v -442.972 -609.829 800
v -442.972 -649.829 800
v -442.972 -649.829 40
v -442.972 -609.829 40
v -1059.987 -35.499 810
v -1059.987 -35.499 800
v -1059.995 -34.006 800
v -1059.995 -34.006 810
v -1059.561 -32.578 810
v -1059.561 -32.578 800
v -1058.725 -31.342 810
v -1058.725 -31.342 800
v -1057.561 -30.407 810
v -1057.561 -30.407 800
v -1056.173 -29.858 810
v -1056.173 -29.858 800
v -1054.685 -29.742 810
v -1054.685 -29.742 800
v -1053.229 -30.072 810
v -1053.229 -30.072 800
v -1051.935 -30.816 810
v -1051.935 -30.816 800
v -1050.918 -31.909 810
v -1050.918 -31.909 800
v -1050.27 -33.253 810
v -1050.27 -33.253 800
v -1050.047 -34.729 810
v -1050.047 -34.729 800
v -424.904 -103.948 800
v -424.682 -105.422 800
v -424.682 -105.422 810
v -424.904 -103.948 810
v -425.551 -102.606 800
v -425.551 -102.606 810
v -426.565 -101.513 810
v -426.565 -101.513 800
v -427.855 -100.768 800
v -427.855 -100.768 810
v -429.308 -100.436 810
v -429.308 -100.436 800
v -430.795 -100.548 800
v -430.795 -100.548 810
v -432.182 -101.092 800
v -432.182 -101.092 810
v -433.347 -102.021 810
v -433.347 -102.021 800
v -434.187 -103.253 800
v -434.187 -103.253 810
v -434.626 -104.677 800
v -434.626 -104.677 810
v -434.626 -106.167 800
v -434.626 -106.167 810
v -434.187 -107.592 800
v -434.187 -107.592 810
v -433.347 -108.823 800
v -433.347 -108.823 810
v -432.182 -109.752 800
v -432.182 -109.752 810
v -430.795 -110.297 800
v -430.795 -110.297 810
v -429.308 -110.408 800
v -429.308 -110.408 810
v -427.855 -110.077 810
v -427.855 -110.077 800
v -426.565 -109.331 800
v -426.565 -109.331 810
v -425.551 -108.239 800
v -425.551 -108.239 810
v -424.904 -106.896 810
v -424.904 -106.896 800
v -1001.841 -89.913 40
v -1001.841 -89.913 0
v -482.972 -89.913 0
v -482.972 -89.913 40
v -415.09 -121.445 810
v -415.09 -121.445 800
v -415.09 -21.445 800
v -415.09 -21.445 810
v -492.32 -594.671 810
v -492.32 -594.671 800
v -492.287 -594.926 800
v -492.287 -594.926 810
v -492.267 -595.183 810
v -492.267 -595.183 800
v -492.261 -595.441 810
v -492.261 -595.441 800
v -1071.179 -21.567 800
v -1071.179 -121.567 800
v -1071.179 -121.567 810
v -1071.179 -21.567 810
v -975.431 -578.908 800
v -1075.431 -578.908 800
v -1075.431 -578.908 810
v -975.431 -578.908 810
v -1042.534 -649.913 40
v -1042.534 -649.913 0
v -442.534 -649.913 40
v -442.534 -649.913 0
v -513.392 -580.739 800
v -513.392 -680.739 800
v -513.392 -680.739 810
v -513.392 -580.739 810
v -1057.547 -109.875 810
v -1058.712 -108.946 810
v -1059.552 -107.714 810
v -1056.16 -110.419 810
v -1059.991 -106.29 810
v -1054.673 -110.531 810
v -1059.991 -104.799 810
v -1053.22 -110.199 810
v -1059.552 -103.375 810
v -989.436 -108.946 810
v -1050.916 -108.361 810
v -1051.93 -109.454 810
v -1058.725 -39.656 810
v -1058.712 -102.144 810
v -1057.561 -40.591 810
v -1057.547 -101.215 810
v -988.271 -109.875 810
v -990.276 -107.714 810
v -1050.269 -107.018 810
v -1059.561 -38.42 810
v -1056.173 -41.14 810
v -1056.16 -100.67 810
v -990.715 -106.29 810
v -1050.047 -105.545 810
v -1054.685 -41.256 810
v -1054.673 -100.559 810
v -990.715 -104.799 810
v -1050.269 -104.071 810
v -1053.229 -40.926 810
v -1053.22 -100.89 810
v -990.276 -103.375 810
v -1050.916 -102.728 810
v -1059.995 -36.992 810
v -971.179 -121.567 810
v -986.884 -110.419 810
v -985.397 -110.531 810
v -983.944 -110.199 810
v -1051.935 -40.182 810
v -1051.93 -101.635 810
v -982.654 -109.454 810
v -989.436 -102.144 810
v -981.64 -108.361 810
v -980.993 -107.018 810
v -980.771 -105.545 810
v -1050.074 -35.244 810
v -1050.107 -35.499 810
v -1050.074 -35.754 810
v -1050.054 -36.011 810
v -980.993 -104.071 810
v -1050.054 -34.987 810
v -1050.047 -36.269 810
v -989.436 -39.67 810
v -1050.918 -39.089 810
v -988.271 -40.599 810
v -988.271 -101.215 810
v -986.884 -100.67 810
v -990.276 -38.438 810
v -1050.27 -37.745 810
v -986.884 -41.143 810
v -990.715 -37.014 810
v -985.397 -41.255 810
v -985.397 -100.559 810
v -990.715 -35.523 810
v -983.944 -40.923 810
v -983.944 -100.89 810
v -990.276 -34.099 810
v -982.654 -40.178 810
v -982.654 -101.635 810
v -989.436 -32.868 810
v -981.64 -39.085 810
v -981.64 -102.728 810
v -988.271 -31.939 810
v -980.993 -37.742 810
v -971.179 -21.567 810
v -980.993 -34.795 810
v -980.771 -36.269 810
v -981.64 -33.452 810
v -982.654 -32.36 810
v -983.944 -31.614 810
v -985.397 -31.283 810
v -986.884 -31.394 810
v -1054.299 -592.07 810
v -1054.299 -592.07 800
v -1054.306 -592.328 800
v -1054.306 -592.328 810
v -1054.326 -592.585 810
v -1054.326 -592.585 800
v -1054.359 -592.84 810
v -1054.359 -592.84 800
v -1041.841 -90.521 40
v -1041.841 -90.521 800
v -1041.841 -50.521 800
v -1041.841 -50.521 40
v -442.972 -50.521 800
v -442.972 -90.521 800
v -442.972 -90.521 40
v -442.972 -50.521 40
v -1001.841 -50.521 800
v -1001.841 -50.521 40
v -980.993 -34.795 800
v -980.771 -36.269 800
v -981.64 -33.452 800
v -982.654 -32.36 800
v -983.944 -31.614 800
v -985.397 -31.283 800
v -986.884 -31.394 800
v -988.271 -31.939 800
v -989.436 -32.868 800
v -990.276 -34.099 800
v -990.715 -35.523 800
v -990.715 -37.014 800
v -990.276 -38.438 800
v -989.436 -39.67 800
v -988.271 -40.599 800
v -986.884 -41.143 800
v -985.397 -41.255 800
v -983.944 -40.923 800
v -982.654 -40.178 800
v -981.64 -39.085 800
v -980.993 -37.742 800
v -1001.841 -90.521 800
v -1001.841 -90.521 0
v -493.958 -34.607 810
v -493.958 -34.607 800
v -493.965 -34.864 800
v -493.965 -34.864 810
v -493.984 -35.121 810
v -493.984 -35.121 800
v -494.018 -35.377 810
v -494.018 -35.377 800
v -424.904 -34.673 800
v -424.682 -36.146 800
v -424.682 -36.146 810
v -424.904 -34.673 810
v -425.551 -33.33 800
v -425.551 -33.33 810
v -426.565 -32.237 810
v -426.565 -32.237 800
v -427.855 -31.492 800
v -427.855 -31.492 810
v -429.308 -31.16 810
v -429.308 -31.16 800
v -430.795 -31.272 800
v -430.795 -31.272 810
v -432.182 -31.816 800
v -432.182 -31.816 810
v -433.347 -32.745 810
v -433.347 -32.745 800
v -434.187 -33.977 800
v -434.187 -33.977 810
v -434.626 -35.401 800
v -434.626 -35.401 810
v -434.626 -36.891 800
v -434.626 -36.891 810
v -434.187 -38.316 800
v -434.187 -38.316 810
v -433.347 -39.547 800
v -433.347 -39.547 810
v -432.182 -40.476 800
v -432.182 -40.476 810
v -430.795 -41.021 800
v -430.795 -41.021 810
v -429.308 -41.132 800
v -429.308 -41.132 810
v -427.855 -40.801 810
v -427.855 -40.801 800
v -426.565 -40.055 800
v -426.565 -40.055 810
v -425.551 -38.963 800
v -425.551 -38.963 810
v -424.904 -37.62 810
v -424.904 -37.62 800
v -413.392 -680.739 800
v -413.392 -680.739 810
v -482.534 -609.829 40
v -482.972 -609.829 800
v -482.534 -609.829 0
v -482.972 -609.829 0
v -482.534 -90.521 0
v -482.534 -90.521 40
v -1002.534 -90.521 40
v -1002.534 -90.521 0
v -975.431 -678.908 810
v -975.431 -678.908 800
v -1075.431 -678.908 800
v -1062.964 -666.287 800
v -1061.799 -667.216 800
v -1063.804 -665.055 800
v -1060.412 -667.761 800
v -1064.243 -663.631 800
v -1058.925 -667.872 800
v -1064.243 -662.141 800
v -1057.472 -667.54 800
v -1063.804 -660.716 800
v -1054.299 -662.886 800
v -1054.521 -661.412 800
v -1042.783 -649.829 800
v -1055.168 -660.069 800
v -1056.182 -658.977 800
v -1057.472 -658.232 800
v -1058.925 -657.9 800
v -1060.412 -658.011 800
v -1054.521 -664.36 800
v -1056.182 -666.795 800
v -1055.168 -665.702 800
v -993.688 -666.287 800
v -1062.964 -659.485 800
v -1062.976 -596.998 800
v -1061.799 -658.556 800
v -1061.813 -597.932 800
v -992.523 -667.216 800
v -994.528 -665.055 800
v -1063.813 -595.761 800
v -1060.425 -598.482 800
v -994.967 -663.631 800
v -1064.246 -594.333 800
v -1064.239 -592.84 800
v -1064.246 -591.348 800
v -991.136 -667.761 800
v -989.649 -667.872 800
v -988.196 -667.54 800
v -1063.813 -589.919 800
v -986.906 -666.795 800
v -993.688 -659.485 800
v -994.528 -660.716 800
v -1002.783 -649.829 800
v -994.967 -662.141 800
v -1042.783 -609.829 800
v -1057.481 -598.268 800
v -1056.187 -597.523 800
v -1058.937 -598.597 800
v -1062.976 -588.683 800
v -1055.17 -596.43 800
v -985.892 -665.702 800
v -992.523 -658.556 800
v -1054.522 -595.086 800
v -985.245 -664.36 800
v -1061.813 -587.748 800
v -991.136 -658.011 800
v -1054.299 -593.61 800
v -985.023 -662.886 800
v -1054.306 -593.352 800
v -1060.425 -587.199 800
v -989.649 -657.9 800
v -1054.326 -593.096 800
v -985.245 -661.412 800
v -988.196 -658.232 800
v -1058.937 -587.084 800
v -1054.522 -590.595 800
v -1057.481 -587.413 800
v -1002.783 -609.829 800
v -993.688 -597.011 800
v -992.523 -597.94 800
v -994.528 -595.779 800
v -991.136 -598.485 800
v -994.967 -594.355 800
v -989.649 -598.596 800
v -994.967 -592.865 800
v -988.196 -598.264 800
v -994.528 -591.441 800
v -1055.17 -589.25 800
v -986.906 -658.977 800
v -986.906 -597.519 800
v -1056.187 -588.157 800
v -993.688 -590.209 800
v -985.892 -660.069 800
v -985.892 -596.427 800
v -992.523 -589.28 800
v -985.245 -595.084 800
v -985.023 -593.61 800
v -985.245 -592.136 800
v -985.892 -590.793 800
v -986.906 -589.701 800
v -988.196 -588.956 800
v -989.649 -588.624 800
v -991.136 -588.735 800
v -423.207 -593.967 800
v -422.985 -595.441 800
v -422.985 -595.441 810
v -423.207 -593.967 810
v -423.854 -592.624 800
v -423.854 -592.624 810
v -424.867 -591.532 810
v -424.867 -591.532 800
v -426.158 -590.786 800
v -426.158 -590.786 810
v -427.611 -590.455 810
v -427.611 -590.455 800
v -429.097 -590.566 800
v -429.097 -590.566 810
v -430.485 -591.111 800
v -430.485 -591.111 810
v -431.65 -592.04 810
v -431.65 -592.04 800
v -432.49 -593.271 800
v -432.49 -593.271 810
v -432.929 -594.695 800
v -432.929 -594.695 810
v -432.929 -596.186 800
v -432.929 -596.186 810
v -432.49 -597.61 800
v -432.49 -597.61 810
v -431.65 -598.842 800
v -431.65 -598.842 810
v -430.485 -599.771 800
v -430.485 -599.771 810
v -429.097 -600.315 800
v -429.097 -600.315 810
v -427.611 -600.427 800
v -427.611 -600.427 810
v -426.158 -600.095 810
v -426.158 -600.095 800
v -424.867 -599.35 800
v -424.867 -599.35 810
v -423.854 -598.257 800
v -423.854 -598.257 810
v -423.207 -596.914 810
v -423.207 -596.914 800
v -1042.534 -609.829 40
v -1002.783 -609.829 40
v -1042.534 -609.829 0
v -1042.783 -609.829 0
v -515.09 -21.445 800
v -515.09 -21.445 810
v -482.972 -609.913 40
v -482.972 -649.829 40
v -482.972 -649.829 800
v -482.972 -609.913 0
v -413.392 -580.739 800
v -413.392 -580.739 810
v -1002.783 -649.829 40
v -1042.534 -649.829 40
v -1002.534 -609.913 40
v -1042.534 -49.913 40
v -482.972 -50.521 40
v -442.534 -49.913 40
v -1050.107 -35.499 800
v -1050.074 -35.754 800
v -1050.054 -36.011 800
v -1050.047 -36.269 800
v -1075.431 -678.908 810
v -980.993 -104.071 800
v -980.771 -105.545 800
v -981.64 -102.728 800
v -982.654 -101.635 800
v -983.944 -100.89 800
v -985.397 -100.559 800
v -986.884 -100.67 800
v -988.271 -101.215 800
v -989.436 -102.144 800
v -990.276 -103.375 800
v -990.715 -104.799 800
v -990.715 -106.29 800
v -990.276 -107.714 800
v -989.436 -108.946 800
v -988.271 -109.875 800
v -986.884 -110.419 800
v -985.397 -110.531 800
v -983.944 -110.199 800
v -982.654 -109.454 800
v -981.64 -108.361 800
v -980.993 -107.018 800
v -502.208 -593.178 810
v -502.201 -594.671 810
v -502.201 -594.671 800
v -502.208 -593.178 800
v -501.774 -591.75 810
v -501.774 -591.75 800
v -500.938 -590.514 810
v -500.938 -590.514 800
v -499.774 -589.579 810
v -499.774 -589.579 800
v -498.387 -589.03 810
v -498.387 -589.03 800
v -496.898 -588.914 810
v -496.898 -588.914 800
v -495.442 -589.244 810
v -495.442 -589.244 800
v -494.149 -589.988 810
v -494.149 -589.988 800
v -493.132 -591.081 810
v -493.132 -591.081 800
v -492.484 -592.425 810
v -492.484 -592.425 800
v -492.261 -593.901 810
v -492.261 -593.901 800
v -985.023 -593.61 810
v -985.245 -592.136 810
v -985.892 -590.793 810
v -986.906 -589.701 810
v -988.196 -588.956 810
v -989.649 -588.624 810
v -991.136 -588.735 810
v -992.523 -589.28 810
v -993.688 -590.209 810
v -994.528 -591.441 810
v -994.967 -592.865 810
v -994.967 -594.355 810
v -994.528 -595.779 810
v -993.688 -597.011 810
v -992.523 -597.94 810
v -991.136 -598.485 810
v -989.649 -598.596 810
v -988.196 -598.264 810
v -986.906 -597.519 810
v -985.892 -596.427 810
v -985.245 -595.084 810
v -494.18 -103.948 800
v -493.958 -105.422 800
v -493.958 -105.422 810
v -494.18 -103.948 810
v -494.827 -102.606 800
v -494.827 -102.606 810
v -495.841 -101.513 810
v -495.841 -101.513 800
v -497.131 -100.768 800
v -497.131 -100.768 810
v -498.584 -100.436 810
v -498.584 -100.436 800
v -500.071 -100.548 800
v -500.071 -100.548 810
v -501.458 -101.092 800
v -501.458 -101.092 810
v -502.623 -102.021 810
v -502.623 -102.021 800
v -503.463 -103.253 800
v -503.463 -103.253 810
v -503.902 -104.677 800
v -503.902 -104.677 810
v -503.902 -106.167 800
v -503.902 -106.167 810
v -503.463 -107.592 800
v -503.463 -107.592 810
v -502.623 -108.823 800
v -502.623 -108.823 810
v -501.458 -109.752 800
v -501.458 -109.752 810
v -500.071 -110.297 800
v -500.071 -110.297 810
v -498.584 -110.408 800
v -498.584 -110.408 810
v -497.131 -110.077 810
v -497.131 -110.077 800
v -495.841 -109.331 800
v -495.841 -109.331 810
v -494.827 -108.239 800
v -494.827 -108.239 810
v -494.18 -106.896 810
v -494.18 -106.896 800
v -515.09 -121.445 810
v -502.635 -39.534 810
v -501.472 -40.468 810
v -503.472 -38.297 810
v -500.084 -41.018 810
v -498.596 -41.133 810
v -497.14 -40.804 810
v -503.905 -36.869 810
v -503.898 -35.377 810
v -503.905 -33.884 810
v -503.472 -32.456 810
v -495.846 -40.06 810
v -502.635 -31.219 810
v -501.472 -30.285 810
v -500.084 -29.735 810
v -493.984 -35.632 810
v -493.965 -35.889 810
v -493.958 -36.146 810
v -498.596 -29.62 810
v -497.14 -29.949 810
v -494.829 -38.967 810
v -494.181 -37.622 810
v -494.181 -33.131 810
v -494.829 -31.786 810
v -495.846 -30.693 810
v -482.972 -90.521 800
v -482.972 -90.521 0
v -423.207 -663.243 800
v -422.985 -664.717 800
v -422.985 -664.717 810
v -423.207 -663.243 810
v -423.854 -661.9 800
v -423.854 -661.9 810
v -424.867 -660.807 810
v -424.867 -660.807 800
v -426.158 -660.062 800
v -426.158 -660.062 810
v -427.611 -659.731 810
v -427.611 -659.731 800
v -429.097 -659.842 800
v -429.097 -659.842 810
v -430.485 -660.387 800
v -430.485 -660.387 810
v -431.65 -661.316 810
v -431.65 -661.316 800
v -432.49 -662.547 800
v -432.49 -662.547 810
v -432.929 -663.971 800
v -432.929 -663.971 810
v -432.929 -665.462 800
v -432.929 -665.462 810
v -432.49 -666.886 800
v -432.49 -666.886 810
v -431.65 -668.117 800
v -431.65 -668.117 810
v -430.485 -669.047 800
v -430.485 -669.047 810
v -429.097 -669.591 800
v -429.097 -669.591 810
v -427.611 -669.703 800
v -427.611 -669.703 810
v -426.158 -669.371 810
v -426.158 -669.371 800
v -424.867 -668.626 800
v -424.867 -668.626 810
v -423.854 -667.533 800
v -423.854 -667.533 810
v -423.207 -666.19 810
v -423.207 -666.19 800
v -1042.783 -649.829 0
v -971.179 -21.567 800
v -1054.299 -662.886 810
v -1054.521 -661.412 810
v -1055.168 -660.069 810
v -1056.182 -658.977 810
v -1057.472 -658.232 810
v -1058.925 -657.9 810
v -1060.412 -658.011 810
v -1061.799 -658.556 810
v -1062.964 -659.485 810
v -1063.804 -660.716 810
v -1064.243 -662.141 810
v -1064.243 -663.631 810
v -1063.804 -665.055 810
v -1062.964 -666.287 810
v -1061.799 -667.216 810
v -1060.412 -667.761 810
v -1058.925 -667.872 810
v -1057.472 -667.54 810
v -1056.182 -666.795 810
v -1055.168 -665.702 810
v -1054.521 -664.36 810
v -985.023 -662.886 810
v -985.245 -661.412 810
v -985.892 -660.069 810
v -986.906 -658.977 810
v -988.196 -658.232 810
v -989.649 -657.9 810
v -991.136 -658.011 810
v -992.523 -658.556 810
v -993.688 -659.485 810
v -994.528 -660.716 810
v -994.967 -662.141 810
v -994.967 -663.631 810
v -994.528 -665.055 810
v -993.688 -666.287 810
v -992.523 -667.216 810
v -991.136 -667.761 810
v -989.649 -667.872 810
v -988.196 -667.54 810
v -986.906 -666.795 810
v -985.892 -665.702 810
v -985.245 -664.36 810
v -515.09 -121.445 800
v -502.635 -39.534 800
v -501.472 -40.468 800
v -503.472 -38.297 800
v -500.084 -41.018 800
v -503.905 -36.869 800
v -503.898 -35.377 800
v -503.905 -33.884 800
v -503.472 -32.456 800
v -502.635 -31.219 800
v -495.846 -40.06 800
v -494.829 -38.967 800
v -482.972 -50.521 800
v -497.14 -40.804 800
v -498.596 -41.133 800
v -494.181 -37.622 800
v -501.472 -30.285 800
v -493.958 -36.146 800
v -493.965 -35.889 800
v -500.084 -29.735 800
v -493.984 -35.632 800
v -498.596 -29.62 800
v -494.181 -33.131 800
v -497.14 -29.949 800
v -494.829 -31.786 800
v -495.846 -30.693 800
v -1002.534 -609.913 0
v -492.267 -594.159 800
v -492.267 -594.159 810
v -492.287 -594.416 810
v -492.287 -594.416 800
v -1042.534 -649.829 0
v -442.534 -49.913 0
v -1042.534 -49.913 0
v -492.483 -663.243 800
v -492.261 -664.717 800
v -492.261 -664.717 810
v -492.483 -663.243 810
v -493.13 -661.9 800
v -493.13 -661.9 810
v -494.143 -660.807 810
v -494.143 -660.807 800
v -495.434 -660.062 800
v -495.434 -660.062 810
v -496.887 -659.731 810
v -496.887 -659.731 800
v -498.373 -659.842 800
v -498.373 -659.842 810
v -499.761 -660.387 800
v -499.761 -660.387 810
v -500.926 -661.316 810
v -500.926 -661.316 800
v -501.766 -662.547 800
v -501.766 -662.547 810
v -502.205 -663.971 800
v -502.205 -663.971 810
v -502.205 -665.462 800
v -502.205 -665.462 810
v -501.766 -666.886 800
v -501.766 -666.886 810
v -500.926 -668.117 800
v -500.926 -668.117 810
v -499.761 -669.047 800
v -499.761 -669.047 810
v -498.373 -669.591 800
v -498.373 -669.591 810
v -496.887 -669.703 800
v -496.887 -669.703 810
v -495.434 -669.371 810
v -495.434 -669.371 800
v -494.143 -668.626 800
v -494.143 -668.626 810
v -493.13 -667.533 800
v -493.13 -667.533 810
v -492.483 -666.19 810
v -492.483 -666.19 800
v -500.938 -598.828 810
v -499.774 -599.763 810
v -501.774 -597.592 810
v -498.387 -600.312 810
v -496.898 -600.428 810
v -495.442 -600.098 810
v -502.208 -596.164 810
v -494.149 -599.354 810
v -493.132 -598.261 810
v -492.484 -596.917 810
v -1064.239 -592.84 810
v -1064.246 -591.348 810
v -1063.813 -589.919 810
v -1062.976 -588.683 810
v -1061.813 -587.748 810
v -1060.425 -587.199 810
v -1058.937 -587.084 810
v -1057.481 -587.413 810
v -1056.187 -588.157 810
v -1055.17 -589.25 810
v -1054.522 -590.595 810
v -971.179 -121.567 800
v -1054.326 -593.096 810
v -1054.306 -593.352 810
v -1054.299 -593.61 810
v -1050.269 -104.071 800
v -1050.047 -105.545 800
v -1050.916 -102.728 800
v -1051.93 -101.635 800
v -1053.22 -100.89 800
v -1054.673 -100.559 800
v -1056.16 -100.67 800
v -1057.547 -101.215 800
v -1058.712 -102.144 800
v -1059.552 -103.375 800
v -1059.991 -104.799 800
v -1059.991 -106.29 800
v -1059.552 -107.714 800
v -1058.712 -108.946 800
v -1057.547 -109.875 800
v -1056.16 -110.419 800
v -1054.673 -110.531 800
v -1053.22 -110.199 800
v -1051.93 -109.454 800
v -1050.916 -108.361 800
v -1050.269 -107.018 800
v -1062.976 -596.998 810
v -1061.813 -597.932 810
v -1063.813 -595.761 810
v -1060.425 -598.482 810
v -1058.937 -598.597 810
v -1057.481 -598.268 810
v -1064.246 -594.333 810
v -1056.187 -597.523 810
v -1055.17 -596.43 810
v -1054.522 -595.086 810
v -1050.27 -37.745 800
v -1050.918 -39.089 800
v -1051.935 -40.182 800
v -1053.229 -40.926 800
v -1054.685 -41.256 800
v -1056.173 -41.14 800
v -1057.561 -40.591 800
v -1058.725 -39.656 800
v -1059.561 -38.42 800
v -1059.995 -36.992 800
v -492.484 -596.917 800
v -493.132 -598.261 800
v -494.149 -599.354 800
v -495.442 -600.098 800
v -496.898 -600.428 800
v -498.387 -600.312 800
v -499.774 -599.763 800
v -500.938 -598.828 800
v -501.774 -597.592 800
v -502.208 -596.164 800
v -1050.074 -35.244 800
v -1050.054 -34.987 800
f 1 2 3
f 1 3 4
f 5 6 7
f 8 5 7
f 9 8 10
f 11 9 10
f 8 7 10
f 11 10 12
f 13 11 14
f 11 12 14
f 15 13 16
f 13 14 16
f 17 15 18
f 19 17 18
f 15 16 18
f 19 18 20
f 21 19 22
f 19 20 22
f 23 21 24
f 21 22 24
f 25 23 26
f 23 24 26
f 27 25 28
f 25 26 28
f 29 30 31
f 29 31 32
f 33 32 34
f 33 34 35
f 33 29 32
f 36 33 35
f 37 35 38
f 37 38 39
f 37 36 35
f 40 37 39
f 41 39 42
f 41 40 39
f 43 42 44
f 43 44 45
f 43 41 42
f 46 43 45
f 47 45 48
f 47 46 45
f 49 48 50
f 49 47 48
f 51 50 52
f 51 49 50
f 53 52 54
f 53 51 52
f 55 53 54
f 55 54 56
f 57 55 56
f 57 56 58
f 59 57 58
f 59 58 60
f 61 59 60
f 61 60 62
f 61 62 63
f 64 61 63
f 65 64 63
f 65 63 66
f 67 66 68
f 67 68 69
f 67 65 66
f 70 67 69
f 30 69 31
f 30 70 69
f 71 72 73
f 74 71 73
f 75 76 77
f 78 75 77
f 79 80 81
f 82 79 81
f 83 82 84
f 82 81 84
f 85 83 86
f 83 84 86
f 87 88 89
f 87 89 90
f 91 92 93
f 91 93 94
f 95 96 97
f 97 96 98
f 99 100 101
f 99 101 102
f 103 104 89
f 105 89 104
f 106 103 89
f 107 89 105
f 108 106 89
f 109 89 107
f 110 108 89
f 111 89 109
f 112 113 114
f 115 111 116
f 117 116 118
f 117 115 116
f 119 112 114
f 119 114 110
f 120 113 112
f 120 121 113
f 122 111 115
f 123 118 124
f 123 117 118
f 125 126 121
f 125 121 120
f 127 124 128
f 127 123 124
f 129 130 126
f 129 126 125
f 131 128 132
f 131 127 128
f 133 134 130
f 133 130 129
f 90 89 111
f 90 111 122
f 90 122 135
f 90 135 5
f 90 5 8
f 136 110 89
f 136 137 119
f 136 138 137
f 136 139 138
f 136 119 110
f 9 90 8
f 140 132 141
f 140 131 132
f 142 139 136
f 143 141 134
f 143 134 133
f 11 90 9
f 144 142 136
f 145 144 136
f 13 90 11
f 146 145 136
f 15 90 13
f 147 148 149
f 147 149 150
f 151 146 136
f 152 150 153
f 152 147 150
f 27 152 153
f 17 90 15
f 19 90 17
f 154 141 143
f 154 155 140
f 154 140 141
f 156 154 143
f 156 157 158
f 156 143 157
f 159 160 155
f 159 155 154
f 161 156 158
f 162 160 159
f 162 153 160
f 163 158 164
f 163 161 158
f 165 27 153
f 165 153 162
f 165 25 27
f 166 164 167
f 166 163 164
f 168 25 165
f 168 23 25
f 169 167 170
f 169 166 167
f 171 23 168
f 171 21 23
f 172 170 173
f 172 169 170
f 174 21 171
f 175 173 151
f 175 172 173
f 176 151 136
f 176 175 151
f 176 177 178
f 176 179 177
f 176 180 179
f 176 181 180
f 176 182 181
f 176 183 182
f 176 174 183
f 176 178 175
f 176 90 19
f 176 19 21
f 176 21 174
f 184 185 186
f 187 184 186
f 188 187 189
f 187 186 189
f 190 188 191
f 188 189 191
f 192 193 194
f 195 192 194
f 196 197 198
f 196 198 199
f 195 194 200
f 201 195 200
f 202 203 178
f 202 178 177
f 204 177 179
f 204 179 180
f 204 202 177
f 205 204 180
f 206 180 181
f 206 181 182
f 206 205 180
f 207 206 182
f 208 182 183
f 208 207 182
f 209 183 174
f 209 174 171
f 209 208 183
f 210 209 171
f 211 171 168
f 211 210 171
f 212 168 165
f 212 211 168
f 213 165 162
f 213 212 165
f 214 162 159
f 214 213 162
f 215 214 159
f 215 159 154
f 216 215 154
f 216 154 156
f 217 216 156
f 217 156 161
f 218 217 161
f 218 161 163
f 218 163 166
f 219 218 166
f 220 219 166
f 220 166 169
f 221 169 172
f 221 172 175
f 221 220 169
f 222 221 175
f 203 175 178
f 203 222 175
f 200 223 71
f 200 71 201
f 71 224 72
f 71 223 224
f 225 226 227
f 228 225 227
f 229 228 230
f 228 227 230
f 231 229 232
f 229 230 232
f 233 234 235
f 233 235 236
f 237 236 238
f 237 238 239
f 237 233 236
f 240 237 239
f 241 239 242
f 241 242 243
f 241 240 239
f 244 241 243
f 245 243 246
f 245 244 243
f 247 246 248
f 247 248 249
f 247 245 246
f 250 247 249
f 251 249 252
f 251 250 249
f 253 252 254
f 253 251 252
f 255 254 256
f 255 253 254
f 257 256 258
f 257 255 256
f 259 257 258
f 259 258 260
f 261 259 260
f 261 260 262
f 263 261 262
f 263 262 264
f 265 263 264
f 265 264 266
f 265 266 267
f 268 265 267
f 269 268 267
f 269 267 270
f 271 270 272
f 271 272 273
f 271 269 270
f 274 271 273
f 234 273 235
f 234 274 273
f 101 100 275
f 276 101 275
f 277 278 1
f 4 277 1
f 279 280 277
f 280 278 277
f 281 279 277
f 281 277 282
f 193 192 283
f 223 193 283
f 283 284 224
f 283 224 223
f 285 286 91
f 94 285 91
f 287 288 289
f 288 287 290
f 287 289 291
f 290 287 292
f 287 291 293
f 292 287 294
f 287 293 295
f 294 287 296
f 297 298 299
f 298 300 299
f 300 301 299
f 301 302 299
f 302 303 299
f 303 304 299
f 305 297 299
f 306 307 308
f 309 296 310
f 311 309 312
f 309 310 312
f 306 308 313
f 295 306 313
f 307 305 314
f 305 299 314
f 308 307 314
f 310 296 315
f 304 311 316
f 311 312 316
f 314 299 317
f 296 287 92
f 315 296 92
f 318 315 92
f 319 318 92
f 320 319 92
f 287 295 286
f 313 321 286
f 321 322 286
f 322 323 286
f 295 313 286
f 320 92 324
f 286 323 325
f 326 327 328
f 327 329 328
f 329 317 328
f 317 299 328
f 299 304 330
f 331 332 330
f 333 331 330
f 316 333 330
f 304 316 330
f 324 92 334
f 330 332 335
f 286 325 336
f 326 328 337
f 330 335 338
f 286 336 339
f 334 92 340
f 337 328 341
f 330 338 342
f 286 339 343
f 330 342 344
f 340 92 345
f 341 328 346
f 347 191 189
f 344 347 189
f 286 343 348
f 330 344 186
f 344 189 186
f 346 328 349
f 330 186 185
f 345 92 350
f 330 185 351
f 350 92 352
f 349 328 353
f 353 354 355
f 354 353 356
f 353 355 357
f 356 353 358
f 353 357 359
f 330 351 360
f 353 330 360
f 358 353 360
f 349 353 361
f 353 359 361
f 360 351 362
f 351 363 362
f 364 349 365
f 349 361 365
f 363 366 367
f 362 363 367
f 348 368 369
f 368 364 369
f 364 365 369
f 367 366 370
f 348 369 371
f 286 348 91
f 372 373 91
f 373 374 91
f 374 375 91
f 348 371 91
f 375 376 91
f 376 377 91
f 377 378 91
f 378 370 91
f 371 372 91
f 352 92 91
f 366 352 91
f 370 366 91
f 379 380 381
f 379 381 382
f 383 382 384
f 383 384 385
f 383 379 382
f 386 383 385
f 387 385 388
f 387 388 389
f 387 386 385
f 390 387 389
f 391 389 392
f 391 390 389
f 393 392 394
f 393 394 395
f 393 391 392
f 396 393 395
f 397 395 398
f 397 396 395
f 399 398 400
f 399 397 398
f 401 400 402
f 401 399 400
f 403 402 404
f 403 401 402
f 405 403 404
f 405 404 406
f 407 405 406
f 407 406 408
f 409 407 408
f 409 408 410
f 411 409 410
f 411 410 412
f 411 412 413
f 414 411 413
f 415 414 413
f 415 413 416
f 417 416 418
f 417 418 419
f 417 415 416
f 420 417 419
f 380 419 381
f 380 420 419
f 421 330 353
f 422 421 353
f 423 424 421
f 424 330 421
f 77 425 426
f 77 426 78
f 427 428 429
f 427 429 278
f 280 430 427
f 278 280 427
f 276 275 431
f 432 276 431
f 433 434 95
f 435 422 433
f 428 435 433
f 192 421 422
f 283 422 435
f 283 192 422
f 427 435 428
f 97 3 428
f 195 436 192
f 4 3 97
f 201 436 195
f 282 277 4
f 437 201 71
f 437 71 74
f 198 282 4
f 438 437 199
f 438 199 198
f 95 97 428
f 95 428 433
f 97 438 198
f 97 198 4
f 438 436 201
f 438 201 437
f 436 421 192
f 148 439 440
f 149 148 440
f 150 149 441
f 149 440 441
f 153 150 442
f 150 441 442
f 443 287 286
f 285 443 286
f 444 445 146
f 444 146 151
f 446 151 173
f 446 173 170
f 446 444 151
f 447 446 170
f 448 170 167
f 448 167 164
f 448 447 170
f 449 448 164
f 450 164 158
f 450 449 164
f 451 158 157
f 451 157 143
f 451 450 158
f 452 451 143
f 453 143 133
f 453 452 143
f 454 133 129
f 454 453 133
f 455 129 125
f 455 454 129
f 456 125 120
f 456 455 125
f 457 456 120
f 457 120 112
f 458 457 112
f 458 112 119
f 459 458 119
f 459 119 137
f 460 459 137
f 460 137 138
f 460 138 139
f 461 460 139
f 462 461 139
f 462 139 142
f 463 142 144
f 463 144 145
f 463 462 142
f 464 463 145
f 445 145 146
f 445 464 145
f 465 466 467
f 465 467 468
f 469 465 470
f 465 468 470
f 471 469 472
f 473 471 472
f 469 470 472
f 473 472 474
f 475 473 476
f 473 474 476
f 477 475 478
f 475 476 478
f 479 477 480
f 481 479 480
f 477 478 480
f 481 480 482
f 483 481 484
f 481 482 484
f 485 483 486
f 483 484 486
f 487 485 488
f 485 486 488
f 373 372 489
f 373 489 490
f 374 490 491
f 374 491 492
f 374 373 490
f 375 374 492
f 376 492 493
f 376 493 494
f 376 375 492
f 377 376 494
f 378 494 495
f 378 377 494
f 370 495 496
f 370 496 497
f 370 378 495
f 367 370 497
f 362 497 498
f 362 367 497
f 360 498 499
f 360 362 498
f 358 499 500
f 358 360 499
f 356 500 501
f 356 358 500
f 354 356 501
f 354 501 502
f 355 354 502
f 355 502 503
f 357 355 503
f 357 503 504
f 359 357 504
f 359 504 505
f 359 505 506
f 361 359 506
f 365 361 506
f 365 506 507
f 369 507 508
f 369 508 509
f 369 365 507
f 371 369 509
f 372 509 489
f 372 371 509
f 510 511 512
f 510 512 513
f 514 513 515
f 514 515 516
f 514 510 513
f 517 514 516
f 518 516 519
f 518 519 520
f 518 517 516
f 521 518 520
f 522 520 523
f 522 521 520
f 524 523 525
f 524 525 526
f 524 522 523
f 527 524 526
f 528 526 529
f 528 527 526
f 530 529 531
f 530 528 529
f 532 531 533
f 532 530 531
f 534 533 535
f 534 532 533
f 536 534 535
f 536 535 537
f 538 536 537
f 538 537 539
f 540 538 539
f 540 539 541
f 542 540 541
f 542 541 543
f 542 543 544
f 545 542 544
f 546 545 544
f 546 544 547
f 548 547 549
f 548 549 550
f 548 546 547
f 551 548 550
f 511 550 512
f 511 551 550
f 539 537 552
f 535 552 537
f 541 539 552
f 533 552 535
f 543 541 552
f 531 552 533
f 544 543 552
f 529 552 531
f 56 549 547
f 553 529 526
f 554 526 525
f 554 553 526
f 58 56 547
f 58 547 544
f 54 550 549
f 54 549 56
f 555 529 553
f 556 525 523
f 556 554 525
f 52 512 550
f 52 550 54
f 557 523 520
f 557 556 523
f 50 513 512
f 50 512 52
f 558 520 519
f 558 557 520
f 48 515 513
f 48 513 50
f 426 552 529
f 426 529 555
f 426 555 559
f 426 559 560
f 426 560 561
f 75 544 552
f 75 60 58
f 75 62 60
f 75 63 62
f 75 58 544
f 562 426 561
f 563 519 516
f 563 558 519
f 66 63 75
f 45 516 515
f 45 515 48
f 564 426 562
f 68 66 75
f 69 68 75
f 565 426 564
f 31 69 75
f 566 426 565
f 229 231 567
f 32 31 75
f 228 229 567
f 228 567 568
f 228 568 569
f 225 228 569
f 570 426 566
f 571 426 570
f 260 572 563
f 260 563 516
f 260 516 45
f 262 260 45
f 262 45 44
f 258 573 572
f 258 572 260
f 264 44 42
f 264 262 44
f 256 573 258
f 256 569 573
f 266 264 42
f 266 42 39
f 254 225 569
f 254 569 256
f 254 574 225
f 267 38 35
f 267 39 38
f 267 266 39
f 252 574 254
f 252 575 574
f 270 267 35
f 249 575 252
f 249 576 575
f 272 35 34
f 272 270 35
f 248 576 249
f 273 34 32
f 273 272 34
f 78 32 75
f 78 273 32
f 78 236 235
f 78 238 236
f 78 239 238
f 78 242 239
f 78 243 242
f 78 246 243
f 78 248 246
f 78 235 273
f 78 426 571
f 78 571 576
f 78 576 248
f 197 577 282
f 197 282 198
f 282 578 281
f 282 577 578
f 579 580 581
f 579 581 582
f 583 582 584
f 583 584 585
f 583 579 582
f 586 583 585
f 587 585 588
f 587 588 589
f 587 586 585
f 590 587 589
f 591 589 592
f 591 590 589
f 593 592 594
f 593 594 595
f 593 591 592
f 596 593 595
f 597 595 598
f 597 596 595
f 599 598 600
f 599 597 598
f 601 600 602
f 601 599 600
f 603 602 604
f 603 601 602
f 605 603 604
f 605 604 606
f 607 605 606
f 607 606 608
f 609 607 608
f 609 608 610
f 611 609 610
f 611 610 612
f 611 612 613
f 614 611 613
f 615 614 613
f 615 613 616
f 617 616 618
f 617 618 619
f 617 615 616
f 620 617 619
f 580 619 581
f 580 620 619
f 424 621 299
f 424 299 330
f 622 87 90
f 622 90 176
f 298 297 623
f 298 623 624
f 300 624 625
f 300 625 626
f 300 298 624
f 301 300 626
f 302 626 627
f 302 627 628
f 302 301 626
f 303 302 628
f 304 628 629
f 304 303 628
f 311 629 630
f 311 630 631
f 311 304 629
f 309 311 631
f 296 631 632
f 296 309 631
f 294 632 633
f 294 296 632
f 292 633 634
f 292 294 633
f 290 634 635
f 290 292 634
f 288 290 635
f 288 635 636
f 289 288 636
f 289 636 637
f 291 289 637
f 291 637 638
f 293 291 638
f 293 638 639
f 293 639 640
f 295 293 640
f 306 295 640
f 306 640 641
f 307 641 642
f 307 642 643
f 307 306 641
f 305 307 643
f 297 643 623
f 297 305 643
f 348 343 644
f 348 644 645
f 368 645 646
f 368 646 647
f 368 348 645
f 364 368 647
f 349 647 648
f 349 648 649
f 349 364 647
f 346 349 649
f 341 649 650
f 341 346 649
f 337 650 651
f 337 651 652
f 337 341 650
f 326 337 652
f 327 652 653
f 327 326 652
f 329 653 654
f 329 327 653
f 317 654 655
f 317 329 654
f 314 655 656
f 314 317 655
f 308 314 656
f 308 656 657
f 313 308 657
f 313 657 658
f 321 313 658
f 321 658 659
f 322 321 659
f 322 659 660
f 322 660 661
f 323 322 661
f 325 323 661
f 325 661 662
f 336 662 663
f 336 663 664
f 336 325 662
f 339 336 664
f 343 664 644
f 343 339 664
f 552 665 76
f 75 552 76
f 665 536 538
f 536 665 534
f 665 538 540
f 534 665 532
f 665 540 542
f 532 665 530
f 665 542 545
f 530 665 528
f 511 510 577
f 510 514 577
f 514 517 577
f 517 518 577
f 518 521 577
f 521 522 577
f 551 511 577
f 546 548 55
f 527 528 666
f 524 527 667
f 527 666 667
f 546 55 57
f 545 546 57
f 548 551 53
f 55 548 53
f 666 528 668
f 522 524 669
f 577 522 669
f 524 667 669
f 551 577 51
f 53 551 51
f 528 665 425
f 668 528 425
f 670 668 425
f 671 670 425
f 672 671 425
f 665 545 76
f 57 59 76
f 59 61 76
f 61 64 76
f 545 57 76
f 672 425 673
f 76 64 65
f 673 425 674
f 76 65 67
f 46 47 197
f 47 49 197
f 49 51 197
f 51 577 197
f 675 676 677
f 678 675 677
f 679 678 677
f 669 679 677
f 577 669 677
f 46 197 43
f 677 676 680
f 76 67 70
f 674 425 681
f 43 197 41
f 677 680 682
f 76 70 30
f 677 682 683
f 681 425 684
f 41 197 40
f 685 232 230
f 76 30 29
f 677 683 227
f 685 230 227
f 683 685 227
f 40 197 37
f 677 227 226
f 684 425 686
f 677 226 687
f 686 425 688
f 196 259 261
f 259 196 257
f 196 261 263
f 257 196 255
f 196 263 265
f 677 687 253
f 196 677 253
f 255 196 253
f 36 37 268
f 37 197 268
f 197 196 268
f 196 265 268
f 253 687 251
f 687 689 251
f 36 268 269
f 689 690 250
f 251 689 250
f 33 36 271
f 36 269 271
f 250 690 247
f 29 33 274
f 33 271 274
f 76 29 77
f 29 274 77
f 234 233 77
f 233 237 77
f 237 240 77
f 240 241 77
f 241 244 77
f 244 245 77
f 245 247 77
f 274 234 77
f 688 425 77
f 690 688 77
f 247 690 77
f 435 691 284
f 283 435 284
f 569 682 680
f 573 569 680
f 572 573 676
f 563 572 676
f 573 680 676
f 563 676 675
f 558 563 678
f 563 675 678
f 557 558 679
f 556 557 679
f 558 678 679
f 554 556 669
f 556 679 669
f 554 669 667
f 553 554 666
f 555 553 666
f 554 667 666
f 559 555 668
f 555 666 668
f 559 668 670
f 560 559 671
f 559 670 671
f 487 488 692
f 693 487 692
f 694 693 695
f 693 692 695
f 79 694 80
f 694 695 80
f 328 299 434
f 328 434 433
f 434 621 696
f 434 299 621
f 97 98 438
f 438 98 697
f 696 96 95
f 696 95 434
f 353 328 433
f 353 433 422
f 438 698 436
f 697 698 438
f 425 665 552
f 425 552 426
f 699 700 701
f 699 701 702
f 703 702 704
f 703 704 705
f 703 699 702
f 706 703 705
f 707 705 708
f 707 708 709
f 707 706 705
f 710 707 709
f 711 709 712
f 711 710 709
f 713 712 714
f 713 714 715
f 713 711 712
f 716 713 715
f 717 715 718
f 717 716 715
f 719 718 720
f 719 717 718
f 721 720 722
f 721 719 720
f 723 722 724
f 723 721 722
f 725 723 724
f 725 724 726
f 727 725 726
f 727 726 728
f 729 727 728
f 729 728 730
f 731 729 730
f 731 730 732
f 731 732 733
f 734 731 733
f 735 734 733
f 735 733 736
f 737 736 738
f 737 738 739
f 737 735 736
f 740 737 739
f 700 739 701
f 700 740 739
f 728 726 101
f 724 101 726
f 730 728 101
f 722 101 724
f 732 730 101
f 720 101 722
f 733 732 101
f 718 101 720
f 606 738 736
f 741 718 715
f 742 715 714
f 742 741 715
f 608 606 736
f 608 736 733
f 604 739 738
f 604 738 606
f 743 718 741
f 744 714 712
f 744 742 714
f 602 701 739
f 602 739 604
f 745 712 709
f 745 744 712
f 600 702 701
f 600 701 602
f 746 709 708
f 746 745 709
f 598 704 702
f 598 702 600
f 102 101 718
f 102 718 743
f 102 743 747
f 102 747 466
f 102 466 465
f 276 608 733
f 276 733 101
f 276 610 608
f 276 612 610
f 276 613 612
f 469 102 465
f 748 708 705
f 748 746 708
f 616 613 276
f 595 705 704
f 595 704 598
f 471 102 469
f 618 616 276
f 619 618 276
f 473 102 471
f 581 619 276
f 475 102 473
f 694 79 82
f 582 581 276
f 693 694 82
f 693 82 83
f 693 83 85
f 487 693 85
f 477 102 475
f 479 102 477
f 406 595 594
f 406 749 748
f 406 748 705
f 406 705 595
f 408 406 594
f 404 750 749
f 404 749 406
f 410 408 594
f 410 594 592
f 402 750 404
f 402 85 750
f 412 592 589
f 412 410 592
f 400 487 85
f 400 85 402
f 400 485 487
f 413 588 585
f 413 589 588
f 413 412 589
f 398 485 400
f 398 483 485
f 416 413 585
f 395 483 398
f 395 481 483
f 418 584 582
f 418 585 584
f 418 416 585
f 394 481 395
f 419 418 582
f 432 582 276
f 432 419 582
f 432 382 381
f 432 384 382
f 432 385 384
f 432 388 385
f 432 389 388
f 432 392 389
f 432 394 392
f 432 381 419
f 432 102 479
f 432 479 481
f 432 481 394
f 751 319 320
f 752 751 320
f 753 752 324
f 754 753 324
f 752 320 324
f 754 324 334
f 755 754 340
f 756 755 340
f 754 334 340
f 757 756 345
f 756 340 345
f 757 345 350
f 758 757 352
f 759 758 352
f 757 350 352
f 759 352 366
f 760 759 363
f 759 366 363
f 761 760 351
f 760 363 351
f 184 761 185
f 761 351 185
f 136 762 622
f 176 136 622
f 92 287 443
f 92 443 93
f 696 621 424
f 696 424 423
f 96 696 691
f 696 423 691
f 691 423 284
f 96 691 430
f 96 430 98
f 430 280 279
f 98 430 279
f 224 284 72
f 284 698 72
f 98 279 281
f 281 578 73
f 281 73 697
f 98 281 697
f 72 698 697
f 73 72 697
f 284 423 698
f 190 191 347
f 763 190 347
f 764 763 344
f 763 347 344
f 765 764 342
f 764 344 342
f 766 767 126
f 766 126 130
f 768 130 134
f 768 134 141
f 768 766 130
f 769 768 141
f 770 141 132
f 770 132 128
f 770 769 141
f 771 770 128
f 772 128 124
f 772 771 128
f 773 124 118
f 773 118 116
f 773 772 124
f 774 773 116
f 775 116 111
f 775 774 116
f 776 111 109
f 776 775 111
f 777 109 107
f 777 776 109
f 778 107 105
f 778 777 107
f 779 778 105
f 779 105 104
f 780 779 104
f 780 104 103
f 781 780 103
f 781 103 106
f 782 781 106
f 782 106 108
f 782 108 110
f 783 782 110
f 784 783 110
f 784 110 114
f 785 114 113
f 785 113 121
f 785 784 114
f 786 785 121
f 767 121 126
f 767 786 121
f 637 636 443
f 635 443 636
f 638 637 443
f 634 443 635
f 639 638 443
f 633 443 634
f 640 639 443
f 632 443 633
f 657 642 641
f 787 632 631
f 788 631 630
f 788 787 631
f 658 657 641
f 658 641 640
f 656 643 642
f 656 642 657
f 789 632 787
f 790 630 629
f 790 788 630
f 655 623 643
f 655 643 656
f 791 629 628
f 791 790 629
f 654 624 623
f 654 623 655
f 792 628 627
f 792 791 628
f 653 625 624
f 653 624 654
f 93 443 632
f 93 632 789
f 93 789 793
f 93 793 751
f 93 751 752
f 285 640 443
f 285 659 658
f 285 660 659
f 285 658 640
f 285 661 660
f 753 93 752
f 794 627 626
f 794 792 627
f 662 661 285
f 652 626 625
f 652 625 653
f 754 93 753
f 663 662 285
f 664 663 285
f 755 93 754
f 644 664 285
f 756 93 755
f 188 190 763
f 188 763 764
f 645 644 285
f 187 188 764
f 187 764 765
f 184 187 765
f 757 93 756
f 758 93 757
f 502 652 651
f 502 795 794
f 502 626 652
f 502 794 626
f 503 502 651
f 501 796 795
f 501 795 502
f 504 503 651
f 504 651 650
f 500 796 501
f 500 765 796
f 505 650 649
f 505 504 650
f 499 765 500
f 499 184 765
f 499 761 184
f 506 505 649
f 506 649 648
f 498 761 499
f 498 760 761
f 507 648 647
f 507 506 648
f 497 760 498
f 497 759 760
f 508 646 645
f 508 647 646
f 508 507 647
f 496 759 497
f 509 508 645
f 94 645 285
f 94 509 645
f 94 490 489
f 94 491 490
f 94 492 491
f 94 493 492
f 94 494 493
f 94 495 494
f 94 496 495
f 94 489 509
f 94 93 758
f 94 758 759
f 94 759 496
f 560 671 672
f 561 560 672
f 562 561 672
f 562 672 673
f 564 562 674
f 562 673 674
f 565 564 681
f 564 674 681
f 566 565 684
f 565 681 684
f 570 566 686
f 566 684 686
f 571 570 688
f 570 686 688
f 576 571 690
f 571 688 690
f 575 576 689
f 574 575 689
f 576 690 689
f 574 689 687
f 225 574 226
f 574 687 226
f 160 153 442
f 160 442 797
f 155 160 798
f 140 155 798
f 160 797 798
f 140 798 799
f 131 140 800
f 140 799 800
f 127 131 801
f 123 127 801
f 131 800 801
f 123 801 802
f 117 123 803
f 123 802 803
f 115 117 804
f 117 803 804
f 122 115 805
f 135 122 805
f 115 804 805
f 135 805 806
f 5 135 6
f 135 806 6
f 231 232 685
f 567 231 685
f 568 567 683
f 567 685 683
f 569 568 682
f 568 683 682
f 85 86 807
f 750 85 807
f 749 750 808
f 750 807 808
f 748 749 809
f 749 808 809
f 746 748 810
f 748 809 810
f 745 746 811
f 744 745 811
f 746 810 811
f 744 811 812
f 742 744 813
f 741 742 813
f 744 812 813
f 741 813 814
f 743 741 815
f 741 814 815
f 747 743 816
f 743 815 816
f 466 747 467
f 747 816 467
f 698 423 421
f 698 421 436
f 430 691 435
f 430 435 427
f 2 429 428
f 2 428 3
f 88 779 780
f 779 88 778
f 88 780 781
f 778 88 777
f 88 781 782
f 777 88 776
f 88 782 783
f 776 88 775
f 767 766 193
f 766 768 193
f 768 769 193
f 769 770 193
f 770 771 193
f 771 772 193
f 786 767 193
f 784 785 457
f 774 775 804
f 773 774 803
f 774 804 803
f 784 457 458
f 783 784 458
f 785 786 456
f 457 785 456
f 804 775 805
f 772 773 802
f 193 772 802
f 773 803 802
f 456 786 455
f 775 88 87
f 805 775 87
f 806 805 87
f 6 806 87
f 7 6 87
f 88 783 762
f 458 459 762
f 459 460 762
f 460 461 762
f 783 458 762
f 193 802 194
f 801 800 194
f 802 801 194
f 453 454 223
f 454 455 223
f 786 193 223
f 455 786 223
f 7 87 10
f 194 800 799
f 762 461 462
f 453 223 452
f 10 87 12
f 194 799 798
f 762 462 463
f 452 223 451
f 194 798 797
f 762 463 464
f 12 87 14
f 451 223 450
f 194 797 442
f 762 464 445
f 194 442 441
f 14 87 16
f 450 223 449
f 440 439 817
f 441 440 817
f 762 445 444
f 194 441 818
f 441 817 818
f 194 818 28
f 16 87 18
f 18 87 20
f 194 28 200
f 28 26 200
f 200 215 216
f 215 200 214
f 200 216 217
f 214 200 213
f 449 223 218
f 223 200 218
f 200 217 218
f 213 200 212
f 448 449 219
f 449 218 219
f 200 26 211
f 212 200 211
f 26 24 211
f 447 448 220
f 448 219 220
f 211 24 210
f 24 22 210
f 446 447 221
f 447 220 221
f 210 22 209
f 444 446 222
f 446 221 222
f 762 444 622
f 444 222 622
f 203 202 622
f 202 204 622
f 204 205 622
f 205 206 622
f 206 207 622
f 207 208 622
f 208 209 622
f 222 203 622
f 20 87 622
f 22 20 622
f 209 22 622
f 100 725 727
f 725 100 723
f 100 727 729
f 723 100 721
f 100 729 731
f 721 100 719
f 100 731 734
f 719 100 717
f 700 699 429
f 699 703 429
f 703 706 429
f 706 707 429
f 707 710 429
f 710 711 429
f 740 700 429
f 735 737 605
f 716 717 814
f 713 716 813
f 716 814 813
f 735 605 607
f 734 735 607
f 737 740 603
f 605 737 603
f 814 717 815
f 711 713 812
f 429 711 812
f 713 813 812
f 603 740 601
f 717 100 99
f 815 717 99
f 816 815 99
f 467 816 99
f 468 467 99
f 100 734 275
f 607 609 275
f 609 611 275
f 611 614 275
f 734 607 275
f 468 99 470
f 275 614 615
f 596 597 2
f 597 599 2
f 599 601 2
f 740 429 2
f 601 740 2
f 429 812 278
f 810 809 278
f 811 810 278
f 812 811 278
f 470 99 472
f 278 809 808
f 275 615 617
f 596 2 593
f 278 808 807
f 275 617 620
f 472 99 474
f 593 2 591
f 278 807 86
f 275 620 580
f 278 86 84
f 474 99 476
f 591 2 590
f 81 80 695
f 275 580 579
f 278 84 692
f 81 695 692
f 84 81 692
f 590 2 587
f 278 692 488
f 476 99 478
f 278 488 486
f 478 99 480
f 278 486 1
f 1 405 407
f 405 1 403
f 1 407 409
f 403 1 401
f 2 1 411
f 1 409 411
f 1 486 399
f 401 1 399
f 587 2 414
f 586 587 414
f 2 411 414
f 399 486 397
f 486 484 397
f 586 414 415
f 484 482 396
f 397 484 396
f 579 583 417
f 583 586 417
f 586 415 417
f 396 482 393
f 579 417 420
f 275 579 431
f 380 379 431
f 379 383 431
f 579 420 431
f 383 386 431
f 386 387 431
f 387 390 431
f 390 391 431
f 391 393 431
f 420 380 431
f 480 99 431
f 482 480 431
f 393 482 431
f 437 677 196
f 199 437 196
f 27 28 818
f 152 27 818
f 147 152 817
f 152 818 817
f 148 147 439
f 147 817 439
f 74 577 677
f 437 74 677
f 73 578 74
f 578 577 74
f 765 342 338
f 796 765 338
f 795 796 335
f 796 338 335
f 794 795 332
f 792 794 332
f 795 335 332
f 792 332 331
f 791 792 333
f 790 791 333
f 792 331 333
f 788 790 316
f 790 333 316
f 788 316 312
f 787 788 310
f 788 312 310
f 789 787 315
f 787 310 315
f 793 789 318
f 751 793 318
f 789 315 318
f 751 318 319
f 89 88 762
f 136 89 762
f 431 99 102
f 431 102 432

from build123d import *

# Parameters (mm, degrees)
F0_W     = 600
F0_H     = 600
F0_W_2   = 520
F0_H_2   = 520
F1_DEPTH = 40
F2_W     = 40
F2_H     = 40
F3_DEPTH = 800
F4_W     = 100
F4_H     = 100
F4_R     = 5
F5_DEPTH = 10


with BuildPart() as f1:
    # F0 (on Top) → F1 (new body)
    with BuildSketch(Plane.XY):
        with Locations((-742.534351, -349.912536)):
            Rectangle(F0_W, F0_H)
        with Locations((-742.534351, -349.912536)):
            Rectangle(F0_W_2, F0_H_2, mode=Mode.SUBTRACT)
    extrude(amount=F1_DEPTH)

    # F2 (on Top) → F3 (join)
    with BuildSketch(Plane.XY):
        with Locations((-462.971604, -70.520664)):
            Rectangle(F2_W, F2_H)
        with Locations((-1021.841088, -70.520664)):
            Rectangle(F2_W, F2_H)
        with Locations((-462.971604, -629.829387)):
            Rectangle(F2_W, F2_H)
        with Locations((-1022.782568, -629.829387)):
            Rectangle(F2_W, F2_H)
    extrude(amount=F3_DEPTH)

    # F4 (on face) → F5 (join)
    with BuildSketch(Plane.XY.offset(800)):
        with Locations((-1021.178722, -71.567007)):
            Rectangle(F4_W, F4_H)
        with Locations((-1055.047035, -105.544642)):
            Circle(F4_R, mode=Mode.SUBTRACT)
        with Locations((-985.77106, -105.544642)):
            Circle(F4_R, mode=Mode.SUBTRACT)
        with BuildLine():
            ThreePointArc((-1059.987431, -35.498975), (-1055.433054, -29.744166), (-1050.047035, -34.729242))
            ThreePointArc((-1050.047035, -34.729242), (-1050.061959, -35.115261), (-1050.106639, -35.498975))
            ThreePointArc((-1050.106639, -35.498975), (-1050.061959, -35.882689), (-1050.047035, -36.268707))
            ThreePointArc((-1050.047035, -36.268707), (-1055.433054, -41.253784), (-1059.987431, -35.498975))
        make_face(mode=Mode.SUBTRACT)
        with Locations((-985.77106, -36.268707)):
            Circle(F4_R, mode=Mode.SUBTRACT)
        with Locations((-465.089649, -71.444585)):
            Rectangle(F4_W, F4_H)
        with Locations((-498.957962, -105.42222)):
            Circle(F4_R, mode=Mode.SUBTRACT)
        with Locations((-429.681987, -105.42222)):
            Circle(F4_R, mode=Mode.SUBTRACT)
        with BuildLine():
            ThreePointArc((-503.898358, -35.376553), (-499.34398, -29.621744), (-493.957962, -34.606821))
            ThreePointArc((-493.957962, -34.606821), (-493.972885, -34.992839), (-494.017566, -35.376553))
            ThreePointArc((-494.017566, -35.376553), (-493.972885, -35.760268), (-493.957962, -36.146286))
            ThreePointArc((-493.957962, -36.146286), (-499.34398, -41.131363), (-503.898358, -35.376553))
        make_face(mode=Mode.SUBTRACT)
        with Locations((-429.681987, -36.146286)):
            Circle(F4_R, mode=Mode.SUBTRACT)
        with Locations((-463.392437, -630.738995)):
            Rectangle(F4_W, F4_H)
        with Locations((-497.260749, -664.71663)):
            Circle(F4_R, mode=Mode.SUBTRACT)
        with Locations((-427.984774, -664.71663)):
            Circle(F4_R, mode=Mode.SUBTRACT)
        with BuildLine():
            ThreePointArc((-502.201145, -594.670963), (-497.646768, -588.916154), (-492.260749, -593.901231))
            ThreePointArc((-492.260749, -593.901231), (-492.275673, -594.287249), (-492.320353, -594.670963))
            ThreePointArc((-492.320353, -594.670963), (-492.275673, -595.054678), (-492.260749, -595.440696))
            ThreePointArc((-492.260749, -595.440696), (-497.646768, -600.425773), (-502.201145, -594.670963))
        make_face(mode=Mode.SUBTRACT)
        with Locations((-427.984774, -595.440696)):
            Circle(F4_R, mode=Mode.SUBTRACT)
        with Locations((-1025.430679, -628.908239)):
            Rectangle(F4_W, F4_H)
        with Locations((-1059.298992, -662.885874)):
            Circle(F4_R, mode=Mode.SUBTRACT)
        with Locations((-990.023017, -662.885874)):
            Circle(F4_R, mode=Mode.SUBTRACT)
        with BuildLine():
            ThreePointArc((-1064.239388, -592.840207), (-1059.685011, -587.085398), (-1054.298992, -592.070474))
            ThreePointArc((-1054.298992, -592.070474), (-1054.313915, -592.456493), (-1054.358596, -592.840207))
            ThreePointArc((-1054.358596, -592.840207), (-1054.313915, -593.223921), (-1054.298992, -593.609939))
            ThreePointArc((-1054.298992, -593.609939), (-1059.685011, -598.595016), (-1064.239388, -592.840207))
        make_face(mode=Mode.SUBTRACT)
        with Locations((-990.023017, -593.609939)):
            Circle(F4_R, mode=Mode.SUBTRACT)
    extrude(amount=F5_DEPTH)


solid = f1.part
